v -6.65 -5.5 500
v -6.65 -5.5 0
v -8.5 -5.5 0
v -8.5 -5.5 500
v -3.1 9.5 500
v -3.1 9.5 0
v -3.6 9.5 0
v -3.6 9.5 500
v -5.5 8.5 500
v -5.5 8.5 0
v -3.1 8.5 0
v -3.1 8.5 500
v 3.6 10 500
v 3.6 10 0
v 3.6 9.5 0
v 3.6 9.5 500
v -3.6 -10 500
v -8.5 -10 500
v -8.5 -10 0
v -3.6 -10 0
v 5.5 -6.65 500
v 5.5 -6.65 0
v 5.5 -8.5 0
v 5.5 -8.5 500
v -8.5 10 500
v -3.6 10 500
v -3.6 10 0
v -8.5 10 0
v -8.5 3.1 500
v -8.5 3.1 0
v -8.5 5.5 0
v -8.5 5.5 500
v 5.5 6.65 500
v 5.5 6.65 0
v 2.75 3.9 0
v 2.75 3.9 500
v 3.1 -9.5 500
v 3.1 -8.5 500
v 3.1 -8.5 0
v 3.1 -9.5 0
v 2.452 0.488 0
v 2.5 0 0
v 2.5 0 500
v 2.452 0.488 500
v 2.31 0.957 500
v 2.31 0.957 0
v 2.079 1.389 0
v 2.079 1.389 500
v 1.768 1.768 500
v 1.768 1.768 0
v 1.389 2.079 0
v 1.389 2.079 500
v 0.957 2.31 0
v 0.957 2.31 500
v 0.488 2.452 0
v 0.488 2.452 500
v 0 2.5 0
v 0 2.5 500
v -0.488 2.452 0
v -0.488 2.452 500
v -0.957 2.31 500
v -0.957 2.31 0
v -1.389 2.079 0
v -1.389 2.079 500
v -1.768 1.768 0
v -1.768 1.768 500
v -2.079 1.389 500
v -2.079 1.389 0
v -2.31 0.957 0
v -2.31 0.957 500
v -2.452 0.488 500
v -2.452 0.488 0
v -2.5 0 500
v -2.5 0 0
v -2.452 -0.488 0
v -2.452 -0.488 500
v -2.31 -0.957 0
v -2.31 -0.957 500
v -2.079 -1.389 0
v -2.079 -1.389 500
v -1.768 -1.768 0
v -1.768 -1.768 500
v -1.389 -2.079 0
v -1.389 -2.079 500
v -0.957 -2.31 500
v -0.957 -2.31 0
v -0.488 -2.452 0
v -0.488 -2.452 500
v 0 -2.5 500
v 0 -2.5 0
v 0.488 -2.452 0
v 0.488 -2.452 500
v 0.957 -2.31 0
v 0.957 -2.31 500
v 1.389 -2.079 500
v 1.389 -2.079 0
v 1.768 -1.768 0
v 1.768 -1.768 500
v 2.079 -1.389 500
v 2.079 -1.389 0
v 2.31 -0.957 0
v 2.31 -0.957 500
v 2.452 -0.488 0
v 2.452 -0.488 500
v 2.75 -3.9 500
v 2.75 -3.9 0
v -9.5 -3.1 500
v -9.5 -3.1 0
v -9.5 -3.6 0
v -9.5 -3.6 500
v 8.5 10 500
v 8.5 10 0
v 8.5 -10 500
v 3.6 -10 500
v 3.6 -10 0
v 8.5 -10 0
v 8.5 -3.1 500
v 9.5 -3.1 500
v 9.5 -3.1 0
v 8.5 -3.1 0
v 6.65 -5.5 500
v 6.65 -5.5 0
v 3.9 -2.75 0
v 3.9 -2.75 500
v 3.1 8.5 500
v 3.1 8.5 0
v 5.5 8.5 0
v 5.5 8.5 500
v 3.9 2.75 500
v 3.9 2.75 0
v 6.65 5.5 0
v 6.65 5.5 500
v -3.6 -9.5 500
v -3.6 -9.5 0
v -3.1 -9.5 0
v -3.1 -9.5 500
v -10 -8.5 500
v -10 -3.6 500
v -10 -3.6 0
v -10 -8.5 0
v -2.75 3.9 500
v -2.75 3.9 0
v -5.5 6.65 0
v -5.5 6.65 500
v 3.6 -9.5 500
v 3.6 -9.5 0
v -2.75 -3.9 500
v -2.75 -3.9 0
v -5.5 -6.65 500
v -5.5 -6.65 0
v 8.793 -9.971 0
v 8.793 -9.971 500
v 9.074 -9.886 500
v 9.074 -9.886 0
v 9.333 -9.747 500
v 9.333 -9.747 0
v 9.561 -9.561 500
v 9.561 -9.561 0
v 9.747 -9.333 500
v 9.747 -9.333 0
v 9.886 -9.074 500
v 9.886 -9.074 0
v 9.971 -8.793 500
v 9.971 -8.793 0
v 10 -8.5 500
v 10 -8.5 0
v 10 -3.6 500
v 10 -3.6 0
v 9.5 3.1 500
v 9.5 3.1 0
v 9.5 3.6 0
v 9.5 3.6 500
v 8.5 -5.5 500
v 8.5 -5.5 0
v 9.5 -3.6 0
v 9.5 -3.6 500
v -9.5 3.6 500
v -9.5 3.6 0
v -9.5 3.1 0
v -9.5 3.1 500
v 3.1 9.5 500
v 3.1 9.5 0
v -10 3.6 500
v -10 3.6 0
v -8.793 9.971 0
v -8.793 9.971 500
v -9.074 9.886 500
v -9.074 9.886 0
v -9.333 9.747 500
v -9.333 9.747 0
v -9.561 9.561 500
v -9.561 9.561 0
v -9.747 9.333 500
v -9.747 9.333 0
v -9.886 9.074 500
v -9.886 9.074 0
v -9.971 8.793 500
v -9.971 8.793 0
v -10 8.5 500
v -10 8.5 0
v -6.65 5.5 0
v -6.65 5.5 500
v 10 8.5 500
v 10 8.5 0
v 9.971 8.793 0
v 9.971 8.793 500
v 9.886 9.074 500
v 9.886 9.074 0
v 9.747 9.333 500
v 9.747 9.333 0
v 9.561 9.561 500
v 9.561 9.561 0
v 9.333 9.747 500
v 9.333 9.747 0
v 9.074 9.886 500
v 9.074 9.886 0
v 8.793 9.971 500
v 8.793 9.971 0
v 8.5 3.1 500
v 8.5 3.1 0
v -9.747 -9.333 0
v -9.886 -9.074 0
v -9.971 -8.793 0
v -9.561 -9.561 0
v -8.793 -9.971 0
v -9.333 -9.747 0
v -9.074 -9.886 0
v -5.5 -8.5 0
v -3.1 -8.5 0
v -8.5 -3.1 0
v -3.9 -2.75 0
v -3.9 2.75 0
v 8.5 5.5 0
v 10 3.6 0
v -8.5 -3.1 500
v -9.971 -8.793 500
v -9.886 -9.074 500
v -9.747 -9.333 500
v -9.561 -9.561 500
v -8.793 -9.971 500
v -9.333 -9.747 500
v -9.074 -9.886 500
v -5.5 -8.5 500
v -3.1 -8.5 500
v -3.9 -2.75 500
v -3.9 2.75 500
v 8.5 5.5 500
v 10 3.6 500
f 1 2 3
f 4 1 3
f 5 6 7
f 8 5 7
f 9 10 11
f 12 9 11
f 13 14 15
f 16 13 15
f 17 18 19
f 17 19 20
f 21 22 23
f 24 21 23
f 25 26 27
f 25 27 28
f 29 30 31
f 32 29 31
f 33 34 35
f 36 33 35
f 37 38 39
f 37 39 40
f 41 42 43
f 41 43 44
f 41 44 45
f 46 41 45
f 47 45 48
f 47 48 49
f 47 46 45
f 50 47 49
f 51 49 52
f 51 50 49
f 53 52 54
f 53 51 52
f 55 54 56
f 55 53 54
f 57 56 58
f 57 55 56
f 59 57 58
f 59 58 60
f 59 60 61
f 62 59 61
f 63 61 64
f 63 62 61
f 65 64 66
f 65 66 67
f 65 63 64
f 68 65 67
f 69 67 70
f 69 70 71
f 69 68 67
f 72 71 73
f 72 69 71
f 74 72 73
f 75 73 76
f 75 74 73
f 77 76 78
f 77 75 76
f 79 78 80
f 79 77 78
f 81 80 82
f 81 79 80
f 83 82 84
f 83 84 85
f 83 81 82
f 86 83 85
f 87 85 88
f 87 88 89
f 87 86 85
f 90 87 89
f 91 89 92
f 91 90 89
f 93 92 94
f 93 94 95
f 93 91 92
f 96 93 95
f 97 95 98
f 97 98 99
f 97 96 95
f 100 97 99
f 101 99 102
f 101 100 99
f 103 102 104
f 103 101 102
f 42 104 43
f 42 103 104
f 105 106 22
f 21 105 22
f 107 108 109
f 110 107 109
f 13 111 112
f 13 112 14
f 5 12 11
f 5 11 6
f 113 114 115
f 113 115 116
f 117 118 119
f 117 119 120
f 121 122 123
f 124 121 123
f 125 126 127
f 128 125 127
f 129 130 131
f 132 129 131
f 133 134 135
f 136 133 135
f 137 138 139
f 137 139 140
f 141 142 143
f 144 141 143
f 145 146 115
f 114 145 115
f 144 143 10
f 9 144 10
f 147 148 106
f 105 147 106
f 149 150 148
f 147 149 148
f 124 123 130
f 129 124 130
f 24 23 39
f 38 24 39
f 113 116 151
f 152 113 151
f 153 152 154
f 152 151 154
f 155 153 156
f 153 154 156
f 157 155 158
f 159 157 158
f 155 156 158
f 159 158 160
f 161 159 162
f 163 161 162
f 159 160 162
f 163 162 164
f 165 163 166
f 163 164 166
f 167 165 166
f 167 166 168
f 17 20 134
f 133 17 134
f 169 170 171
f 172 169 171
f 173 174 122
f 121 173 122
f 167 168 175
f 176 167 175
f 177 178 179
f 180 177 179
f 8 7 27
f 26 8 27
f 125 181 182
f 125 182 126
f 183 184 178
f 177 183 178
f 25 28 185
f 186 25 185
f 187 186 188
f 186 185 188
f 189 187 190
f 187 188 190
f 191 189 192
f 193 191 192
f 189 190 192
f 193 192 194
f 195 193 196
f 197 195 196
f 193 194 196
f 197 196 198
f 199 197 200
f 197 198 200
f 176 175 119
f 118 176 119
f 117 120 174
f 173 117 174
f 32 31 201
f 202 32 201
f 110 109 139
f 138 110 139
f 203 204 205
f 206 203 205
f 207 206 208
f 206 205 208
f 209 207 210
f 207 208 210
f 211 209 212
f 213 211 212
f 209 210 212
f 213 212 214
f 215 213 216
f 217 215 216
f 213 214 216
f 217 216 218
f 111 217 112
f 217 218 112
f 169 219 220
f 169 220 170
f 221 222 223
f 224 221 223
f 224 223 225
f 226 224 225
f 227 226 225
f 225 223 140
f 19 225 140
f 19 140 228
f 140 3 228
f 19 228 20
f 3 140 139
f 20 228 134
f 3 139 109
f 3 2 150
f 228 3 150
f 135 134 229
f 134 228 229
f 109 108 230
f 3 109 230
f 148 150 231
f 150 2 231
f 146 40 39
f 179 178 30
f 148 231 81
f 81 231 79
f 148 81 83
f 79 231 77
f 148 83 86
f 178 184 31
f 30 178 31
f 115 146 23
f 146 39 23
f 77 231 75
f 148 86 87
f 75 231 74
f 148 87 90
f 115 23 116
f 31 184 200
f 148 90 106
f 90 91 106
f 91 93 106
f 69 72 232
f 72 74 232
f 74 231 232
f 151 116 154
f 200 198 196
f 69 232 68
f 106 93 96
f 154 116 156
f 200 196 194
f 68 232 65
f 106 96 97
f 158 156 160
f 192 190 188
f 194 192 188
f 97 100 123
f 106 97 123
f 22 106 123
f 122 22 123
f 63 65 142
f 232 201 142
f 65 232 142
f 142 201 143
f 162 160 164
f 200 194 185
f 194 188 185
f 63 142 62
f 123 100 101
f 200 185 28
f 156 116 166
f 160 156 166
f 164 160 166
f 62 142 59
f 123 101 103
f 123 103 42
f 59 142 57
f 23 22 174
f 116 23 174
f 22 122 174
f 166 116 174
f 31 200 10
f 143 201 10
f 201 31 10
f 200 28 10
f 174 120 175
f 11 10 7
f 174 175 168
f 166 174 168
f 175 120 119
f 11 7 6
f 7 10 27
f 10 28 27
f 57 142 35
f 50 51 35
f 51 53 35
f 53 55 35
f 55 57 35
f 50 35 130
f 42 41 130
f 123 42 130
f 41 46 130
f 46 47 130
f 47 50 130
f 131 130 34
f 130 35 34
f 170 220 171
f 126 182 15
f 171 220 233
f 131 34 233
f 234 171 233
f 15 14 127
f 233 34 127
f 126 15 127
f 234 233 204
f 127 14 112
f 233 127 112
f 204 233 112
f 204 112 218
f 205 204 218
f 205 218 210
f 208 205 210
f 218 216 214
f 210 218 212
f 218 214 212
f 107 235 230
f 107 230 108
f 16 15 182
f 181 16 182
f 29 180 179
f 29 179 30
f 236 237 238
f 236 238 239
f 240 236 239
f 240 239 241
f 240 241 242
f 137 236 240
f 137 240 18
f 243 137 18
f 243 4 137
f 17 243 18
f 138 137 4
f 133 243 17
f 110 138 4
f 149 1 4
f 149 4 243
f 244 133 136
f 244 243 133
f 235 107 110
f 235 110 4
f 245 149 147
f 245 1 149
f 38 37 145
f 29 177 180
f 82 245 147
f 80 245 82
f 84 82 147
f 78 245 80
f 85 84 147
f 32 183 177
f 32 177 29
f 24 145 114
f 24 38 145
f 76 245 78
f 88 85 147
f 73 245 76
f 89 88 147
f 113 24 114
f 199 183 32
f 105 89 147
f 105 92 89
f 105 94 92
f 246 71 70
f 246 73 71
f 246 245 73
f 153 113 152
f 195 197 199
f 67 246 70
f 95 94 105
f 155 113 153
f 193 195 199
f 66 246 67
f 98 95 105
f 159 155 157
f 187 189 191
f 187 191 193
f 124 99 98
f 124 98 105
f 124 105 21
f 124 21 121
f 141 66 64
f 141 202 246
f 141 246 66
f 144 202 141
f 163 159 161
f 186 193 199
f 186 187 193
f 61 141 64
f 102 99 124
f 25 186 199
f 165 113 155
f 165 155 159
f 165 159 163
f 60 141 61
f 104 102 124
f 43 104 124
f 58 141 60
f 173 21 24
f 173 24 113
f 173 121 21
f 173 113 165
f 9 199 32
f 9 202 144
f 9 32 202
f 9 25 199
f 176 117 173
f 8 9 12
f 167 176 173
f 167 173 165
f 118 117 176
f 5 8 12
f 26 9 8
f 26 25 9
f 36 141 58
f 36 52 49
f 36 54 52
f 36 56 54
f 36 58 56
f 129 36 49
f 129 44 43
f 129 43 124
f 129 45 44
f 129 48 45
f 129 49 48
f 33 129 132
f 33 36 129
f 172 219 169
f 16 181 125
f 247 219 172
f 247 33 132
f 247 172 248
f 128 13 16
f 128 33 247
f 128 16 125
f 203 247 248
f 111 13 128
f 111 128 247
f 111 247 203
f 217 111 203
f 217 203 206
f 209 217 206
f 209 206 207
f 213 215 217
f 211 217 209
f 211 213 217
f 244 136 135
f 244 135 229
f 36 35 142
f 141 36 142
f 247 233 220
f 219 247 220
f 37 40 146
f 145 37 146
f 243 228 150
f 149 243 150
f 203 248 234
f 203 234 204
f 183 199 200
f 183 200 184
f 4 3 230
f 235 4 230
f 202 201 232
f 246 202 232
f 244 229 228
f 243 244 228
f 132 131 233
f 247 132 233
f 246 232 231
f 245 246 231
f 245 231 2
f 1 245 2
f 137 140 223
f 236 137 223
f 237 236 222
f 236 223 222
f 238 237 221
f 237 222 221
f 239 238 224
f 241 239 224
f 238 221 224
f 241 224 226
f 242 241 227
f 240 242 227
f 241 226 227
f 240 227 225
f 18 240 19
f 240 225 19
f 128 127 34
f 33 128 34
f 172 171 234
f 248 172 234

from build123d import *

# Parameters (mm, degrees)
EXTRUDE_1_DEPTH = 500


with BuildPart() as part:
    # 草图1 → 凸台-拉伸1 (new body)
    with BuildSketch(Plane.XY):
        with BuildLine():
            Line((8.5, 10), (3.6, 10))
            Line((3.6, 10), (3.6, 9.5))
            Line((3.6, 9.5), (3.1, 9.5))
            Line((3.1, 9.5), (3.1, 8.5))
            Line((3.1, 8.5), (5.5, 8.5))
            Line((5.5, 8.5), (5.5, 6.65))
            Line((5.5, 6.65), (2.75, 3.9))
            Line((2.75, 3.9), (-2.75, 3.9))
            Line((-2.75, 3.9), (-5.5, 6.65))
            Line((-5.5, 6.65), (-5.5, 8.5))
            Line((-5.5, 8.5), (-3.1, 8.5))
            Line((-3.1, 8.5), (-3.1, 9.5))
            Line((-3.1, 9.5), (-3.6, 9.5))
            Line((-3.6, 9.5), (-3.6, 10))
            Line((-3.6, 10), (-8.5, 10))
            ThreePointArc((-8.5, 10), (-9.560660172, 9.560660172), (-10, 8.5))
            Line((-10, 8.5), (-10, 3.6))
            Line((-10, 3.6), (-9.5, 3.6))
            Line((-9.5, 3.6), (-9.5, 3.1))
            Line((-9.5, 3.1), (-8.5, 3.1))
            Line((-8.5, 3.1), (-8.5, 5.5))
            Line((-8.5, 5.5), (-6.65, 5.5))
            Line((-6.65, 5.5), (-3.9, 2.75))
            Line((-3.9, 2.75), (-3.9, -2.75))
            Line((-3.9, -2.75), (-6.65, -5.5))
            Line((-6.65, -5.5), (-8.5, -5.5))
            Line((-8.5, -5.5), (-8.5, -3.1))
            Line((-8.5, -3.1), (-9.5, -3.1))
            Line((-9.5, -3.1), (-9.5, -3.6))
            Line((-9.5, -3.6), (-10, -3.6))
            Line((-10, -3.6), (-10, -8.5))
            ThreePointArc((-10, -8.5), (-9.560660172, -9.560660172), (-8.5, -10))
            Line((-8.5, -10), (-3.6, -10))
            Line((-3.6, -10), (-3.6, -9.5))
            Line((-3.6, -9.5), (-3.1, -9.5))
            Line((-3.1, -9.5), (-3.1, -8.5))
            Line((-3.1, -8.5), (-5.5, -8.5))
            Line((-5.5, -8.5), (-5.5, -6.65))
            Line((-5.5, -6.65), (-2.75, -3.9))
            Line((-2.75, -3.9), (2.75, -3.9))
            Line((2.75, -3.9), (5.5, -6.65))
            Line((5.5, -6.65), (5.5, -8.5))
            Line((5.5, -8.5), (3.1, -8.5))
            Line((3.1, -8.5), (3.1, -9.5))
            Line((3.1, -9.5), (3.6, -9.5))
            Line((3.6, -9.5), (3.6, -10))
            Line((3.6, -10), (8.5, -10))
            ThreePointArc((8.5, -10), (9.560660172, -9.560660172), (10, -8.5))
            Line((10, -8.5), (10, -3.6))
            Line((10, -3.6), (9.5, -3.6))
            Line((9.5, -3.6), (9.5, -3.1))
            Line((9.5, -3.1), (8.5, -3.1))
            Line((8.5, -3.1), (8.5, -5.5))
            Line((8.5, -5.5), (6.65, -5.5))
            Line((6.65, -5.5), (3.9, -2.75))
            Line((3.9, -2.75), (3.9, 2.75))
            Line((3.9, 2.75), (6.65, 5.5))
            Line((6.65, 5.5), (8.5, 5.5))
            Line((8.5, 5.5), (8.5, 3.1))
            Line((8.5, 3.1), (9.5, 3.1))
            Line((9.5, 3.1), (9.5, 3.6))
            Line((9.5, 3.6), (10, 3.6))
            Line((10, 3.6), (10, 8.5))
            ThreePointArc((10, 8.5), (9.560660172, 9.560660172), (8.5, 10))
        make_face()
        with BuildLine():
            ThreePointArc((-2.5, 0), (0, -2.5), (2.5, 0))
            ThreePointArc((2.5, 0), (0, 2.5), (-2.5, 0))
        make_face(mode=Mode.SUBTRACT)
    extrude(amount=EXTRUDE_1_DEPTH)


solid = part.part
